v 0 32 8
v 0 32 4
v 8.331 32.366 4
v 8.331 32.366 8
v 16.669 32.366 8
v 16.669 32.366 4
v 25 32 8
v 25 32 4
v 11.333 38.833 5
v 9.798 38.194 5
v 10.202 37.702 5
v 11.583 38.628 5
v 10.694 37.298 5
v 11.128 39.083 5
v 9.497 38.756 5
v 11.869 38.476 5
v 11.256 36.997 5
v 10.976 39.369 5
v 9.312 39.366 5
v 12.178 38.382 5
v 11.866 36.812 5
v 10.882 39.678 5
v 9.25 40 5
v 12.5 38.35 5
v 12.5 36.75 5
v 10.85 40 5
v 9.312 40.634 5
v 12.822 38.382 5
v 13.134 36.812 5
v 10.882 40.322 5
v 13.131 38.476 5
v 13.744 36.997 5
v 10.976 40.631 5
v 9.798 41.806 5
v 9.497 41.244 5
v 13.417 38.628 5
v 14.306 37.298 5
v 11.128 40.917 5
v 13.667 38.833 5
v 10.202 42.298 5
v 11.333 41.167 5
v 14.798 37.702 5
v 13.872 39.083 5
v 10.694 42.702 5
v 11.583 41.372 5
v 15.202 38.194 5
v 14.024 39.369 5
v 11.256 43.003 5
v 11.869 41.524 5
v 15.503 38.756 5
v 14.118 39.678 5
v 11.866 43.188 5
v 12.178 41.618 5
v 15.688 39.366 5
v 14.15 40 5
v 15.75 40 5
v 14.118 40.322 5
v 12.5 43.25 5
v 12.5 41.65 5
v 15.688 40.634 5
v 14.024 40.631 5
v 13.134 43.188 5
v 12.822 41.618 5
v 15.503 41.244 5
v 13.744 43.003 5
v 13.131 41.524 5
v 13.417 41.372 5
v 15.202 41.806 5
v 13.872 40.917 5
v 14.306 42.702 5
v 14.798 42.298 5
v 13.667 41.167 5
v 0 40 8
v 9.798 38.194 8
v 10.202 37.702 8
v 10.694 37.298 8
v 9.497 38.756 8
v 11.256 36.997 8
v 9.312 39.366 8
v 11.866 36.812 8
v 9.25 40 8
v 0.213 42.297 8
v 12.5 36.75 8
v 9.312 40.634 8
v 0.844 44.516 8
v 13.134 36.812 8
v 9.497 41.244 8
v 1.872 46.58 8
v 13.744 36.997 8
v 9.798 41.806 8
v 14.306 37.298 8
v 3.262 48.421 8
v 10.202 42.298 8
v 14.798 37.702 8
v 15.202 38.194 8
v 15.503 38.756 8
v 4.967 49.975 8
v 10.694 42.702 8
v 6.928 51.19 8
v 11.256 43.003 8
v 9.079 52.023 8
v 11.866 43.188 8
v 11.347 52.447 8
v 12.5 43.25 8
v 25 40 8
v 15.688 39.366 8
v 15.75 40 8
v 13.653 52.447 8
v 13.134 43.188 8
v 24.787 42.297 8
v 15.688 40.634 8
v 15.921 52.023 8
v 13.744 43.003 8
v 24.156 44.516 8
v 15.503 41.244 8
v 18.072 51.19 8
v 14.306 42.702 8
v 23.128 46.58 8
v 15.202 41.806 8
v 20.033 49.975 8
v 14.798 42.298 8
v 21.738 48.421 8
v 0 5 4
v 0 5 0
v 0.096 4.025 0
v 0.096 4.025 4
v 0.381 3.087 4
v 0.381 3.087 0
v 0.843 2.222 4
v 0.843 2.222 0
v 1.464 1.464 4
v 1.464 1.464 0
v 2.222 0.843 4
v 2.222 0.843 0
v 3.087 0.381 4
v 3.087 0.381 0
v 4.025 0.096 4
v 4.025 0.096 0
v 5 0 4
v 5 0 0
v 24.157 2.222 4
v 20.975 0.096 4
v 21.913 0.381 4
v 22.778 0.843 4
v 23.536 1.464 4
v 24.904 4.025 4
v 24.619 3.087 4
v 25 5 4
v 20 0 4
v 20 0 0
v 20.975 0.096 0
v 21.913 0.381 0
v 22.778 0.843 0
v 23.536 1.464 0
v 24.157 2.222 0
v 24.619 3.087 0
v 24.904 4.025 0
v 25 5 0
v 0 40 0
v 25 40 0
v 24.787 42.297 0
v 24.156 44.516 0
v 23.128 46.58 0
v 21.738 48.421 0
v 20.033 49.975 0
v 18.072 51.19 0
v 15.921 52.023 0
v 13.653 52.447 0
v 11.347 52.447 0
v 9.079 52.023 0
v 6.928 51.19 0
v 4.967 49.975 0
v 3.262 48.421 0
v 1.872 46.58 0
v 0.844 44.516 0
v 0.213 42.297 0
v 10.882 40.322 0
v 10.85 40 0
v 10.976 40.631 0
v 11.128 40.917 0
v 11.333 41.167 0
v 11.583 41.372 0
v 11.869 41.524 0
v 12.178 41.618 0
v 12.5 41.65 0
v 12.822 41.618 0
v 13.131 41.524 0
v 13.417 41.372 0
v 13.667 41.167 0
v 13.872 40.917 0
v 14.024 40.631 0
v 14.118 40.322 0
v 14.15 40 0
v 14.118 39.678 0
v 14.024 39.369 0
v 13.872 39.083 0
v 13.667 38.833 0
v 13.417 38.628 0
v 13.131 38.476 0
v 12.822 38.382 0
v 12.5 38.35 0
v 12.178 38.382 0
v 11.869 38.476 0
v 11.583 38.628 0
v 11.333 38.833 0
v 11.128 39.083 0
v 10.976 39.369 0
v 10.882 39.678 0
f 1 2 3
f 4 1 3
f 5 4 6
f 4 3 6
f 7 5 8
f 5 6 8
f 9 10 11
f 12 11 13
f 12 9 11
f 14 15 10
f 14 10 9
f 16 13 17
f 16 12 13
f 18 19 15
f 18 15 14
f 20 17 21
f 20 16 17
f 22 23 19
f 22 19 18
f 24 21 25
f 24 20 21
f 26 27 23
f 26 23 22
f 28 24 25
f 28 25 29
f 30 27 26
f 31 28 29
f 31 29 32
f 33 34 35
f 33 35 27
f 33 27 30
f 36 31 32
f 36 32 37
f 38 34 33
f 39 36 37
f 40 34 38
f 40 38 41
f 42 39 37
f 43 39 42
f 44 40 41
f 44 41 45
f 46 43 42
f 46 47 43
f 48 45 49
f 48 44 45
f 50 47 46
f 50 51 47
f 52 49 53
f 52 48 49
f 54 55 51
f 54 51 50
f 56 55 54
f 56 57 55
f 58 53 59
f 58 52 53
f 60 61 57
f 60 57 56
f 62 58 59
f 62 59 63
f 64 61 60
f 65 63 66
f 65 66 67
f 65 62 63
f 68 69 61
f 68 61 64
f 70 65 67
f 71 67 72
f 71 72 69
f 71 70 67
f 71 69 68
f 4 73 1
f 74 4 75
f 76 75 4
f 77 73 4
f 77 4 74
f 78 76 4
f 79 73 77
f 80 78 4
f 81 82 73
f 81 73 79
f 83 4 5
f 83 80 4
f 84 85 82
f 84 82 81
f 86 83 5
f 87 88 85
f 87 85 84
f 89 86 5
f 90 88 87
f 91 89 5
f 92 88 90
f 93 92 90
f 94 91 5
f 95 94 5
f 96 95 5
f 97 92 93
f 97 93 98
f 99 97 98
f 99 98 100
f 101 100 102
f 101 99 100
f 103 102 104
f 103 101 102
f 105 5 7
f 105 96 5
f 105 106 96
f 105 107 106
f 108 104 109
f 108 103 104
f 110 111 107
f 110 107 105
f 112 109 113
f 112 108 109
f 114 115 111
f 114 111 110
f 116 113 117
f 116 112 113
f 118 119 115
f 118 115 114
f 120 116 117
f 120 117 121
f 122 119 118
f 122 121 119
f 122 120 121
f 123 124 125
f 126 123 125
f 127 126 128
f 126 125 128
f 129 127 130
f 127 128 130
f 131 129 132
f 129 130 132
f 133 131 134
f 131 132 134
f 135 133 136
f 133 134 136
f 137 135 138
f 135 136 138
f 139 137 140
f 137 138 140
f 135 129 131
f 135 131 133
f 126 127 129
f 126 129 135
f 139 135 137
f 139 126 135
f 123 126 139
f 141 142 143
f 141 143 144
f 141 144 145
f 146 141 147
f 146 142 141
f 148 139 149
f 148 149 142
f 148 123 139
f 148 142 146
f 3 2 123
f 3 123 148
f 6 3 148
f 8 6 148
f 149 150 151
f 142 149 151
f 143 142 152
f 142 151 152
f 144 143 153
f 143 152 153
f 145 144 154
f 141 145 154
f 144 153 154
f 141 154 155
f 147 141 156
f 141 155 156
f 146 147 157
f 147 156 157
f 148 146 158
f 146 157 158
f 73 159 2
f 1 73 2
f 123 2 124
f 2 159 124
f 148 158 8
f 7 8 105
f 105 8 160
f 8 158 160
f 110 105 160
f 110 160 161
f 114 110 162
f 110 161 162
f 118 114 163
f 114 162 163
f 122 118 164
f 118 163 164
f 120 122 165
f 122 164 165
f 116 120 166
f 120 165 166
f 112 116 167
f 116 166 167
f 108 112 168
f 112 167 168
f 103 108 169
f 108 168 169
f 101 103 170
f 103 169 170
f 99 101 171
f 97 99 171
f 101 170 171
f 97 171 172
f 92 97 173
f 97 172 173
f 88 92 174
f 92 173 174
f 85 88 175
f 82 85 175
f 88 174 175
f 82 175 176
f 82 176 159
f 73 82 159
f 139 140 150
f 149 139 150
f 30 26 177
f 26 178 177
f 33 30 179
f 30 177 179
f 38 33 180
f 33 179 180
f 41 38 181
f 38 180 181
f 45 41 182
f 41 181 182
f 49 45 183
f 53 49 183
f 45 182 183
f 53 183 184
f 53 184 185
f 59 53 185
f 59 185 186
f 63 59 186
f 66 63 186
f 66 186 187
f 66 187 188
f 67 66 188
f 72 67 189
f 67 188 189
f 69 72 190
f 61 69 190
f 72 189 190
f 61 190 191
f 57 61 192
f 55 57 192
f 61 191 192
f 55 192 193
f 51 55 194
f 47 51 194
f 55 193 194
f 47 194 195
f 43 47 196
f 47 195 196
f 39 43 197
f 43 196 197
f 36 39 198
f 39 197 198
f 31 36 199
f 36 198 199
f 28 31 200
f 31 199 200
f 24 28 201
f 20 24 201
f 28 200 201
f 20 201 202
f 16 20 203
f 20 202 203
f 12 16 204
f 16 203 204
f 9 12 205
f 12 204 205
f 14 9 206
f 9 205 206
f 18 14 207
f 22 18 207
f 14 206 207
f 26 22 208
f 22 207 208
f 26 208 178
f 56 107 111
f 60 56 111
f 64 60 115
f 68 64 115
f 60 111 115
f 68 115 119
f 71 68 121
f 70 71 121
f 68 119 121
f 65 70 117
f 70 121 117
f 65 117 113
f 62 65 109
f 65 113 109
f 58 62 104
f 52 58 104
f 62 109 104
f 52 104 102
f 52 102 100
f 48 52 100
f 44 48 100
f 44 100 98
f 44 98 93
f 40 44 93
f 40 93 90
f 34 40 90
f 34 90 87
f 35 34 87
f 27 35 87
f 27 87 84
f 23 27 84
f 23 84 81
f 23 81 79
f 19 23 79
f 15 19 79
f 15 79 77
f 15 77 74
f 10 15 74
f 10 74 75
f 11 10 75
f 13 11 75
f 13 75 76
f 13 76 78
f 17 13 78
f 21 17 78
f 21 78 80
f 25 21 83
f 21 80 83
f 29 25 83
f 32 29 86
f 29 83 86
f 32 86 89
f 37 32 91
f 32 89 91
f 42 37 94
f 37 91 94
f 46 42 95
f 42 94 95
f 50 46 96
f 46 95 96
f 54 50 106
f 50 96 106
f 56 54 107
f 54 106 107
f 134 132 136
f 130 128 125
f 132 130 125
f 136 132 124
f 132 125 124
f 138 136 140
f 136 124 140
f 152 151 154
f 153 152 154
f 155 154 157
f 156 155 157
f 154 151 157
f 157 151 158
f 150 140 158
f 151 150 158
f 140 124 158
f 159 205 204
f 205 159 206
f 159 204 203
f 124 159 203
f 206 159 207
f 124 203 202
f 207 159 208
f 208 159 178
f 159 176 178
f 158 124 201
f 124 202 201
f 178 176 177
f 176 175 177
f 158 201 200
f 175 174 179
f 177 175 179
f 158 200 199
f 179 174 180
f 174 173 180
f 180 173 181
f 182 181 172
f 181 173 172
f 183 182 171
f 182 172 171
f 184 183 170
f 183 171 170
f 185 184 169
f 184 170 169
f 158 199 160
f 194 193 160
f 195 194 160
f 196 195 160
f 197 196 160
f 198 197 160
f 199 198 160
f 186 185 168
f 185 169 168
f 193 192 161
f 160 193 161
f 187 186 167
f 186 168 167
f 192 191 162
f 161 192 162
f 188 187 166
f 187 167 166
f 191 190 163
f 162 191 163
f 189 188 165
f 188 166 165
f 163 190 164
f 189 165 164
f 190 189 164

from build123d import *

# Parameters (mm, degrees)
F1_DEPTH       = 8
F2_DEPTH       = 4
F4_D           = 3.3
F4_CBORE_D     = 6.5
F4_CBORE_DEPTH = 3


with BuildPart() as f1:
    # F0 (on Top) → F1 (new body)
    with BuildSketch(Plane.XY):
        with BuildLine():
            Line((0, 40), (0, 32))
            ThreePointArc((0, 32), (12.5, 32.4116301035), (25, 32))
            Line((25, 32), (25, 40))
            ThreePointArc((25, 40), (12.5, 52.5), (0, 40))
        make_face()
    extrude(amount=F1_DEPTH)

    # F0 (on Top) → F2 (join)
    with BuildSketch(Plane.XY):
        with BuildLine():
            Line((0, 32), (0, 5))
            ThreePointArc((0, 5), (1.4644660941, 1.4644660941), (5, 0))
            Line((5, 0), (20, 0))
            ThreePointArc((20, 0), (23.5355339059, 1.4644660941), (25, 5))
            Line((25, 5), (25, 32))
            ThreePointArc((25, 32), (12.5, 32.4116301035), (0, 32))
        make_face()
    extrude(amount=F2_DEPTH)

    # F4 (through all)
    with Locations(Plane.XY.offset(8)):
        with Locations((12.5, 40)):
            CounterBoreHole(F4_D / 2, F4_CBORE_D / 2, F4_CBORE_DEPTH)


solid = f1.part
